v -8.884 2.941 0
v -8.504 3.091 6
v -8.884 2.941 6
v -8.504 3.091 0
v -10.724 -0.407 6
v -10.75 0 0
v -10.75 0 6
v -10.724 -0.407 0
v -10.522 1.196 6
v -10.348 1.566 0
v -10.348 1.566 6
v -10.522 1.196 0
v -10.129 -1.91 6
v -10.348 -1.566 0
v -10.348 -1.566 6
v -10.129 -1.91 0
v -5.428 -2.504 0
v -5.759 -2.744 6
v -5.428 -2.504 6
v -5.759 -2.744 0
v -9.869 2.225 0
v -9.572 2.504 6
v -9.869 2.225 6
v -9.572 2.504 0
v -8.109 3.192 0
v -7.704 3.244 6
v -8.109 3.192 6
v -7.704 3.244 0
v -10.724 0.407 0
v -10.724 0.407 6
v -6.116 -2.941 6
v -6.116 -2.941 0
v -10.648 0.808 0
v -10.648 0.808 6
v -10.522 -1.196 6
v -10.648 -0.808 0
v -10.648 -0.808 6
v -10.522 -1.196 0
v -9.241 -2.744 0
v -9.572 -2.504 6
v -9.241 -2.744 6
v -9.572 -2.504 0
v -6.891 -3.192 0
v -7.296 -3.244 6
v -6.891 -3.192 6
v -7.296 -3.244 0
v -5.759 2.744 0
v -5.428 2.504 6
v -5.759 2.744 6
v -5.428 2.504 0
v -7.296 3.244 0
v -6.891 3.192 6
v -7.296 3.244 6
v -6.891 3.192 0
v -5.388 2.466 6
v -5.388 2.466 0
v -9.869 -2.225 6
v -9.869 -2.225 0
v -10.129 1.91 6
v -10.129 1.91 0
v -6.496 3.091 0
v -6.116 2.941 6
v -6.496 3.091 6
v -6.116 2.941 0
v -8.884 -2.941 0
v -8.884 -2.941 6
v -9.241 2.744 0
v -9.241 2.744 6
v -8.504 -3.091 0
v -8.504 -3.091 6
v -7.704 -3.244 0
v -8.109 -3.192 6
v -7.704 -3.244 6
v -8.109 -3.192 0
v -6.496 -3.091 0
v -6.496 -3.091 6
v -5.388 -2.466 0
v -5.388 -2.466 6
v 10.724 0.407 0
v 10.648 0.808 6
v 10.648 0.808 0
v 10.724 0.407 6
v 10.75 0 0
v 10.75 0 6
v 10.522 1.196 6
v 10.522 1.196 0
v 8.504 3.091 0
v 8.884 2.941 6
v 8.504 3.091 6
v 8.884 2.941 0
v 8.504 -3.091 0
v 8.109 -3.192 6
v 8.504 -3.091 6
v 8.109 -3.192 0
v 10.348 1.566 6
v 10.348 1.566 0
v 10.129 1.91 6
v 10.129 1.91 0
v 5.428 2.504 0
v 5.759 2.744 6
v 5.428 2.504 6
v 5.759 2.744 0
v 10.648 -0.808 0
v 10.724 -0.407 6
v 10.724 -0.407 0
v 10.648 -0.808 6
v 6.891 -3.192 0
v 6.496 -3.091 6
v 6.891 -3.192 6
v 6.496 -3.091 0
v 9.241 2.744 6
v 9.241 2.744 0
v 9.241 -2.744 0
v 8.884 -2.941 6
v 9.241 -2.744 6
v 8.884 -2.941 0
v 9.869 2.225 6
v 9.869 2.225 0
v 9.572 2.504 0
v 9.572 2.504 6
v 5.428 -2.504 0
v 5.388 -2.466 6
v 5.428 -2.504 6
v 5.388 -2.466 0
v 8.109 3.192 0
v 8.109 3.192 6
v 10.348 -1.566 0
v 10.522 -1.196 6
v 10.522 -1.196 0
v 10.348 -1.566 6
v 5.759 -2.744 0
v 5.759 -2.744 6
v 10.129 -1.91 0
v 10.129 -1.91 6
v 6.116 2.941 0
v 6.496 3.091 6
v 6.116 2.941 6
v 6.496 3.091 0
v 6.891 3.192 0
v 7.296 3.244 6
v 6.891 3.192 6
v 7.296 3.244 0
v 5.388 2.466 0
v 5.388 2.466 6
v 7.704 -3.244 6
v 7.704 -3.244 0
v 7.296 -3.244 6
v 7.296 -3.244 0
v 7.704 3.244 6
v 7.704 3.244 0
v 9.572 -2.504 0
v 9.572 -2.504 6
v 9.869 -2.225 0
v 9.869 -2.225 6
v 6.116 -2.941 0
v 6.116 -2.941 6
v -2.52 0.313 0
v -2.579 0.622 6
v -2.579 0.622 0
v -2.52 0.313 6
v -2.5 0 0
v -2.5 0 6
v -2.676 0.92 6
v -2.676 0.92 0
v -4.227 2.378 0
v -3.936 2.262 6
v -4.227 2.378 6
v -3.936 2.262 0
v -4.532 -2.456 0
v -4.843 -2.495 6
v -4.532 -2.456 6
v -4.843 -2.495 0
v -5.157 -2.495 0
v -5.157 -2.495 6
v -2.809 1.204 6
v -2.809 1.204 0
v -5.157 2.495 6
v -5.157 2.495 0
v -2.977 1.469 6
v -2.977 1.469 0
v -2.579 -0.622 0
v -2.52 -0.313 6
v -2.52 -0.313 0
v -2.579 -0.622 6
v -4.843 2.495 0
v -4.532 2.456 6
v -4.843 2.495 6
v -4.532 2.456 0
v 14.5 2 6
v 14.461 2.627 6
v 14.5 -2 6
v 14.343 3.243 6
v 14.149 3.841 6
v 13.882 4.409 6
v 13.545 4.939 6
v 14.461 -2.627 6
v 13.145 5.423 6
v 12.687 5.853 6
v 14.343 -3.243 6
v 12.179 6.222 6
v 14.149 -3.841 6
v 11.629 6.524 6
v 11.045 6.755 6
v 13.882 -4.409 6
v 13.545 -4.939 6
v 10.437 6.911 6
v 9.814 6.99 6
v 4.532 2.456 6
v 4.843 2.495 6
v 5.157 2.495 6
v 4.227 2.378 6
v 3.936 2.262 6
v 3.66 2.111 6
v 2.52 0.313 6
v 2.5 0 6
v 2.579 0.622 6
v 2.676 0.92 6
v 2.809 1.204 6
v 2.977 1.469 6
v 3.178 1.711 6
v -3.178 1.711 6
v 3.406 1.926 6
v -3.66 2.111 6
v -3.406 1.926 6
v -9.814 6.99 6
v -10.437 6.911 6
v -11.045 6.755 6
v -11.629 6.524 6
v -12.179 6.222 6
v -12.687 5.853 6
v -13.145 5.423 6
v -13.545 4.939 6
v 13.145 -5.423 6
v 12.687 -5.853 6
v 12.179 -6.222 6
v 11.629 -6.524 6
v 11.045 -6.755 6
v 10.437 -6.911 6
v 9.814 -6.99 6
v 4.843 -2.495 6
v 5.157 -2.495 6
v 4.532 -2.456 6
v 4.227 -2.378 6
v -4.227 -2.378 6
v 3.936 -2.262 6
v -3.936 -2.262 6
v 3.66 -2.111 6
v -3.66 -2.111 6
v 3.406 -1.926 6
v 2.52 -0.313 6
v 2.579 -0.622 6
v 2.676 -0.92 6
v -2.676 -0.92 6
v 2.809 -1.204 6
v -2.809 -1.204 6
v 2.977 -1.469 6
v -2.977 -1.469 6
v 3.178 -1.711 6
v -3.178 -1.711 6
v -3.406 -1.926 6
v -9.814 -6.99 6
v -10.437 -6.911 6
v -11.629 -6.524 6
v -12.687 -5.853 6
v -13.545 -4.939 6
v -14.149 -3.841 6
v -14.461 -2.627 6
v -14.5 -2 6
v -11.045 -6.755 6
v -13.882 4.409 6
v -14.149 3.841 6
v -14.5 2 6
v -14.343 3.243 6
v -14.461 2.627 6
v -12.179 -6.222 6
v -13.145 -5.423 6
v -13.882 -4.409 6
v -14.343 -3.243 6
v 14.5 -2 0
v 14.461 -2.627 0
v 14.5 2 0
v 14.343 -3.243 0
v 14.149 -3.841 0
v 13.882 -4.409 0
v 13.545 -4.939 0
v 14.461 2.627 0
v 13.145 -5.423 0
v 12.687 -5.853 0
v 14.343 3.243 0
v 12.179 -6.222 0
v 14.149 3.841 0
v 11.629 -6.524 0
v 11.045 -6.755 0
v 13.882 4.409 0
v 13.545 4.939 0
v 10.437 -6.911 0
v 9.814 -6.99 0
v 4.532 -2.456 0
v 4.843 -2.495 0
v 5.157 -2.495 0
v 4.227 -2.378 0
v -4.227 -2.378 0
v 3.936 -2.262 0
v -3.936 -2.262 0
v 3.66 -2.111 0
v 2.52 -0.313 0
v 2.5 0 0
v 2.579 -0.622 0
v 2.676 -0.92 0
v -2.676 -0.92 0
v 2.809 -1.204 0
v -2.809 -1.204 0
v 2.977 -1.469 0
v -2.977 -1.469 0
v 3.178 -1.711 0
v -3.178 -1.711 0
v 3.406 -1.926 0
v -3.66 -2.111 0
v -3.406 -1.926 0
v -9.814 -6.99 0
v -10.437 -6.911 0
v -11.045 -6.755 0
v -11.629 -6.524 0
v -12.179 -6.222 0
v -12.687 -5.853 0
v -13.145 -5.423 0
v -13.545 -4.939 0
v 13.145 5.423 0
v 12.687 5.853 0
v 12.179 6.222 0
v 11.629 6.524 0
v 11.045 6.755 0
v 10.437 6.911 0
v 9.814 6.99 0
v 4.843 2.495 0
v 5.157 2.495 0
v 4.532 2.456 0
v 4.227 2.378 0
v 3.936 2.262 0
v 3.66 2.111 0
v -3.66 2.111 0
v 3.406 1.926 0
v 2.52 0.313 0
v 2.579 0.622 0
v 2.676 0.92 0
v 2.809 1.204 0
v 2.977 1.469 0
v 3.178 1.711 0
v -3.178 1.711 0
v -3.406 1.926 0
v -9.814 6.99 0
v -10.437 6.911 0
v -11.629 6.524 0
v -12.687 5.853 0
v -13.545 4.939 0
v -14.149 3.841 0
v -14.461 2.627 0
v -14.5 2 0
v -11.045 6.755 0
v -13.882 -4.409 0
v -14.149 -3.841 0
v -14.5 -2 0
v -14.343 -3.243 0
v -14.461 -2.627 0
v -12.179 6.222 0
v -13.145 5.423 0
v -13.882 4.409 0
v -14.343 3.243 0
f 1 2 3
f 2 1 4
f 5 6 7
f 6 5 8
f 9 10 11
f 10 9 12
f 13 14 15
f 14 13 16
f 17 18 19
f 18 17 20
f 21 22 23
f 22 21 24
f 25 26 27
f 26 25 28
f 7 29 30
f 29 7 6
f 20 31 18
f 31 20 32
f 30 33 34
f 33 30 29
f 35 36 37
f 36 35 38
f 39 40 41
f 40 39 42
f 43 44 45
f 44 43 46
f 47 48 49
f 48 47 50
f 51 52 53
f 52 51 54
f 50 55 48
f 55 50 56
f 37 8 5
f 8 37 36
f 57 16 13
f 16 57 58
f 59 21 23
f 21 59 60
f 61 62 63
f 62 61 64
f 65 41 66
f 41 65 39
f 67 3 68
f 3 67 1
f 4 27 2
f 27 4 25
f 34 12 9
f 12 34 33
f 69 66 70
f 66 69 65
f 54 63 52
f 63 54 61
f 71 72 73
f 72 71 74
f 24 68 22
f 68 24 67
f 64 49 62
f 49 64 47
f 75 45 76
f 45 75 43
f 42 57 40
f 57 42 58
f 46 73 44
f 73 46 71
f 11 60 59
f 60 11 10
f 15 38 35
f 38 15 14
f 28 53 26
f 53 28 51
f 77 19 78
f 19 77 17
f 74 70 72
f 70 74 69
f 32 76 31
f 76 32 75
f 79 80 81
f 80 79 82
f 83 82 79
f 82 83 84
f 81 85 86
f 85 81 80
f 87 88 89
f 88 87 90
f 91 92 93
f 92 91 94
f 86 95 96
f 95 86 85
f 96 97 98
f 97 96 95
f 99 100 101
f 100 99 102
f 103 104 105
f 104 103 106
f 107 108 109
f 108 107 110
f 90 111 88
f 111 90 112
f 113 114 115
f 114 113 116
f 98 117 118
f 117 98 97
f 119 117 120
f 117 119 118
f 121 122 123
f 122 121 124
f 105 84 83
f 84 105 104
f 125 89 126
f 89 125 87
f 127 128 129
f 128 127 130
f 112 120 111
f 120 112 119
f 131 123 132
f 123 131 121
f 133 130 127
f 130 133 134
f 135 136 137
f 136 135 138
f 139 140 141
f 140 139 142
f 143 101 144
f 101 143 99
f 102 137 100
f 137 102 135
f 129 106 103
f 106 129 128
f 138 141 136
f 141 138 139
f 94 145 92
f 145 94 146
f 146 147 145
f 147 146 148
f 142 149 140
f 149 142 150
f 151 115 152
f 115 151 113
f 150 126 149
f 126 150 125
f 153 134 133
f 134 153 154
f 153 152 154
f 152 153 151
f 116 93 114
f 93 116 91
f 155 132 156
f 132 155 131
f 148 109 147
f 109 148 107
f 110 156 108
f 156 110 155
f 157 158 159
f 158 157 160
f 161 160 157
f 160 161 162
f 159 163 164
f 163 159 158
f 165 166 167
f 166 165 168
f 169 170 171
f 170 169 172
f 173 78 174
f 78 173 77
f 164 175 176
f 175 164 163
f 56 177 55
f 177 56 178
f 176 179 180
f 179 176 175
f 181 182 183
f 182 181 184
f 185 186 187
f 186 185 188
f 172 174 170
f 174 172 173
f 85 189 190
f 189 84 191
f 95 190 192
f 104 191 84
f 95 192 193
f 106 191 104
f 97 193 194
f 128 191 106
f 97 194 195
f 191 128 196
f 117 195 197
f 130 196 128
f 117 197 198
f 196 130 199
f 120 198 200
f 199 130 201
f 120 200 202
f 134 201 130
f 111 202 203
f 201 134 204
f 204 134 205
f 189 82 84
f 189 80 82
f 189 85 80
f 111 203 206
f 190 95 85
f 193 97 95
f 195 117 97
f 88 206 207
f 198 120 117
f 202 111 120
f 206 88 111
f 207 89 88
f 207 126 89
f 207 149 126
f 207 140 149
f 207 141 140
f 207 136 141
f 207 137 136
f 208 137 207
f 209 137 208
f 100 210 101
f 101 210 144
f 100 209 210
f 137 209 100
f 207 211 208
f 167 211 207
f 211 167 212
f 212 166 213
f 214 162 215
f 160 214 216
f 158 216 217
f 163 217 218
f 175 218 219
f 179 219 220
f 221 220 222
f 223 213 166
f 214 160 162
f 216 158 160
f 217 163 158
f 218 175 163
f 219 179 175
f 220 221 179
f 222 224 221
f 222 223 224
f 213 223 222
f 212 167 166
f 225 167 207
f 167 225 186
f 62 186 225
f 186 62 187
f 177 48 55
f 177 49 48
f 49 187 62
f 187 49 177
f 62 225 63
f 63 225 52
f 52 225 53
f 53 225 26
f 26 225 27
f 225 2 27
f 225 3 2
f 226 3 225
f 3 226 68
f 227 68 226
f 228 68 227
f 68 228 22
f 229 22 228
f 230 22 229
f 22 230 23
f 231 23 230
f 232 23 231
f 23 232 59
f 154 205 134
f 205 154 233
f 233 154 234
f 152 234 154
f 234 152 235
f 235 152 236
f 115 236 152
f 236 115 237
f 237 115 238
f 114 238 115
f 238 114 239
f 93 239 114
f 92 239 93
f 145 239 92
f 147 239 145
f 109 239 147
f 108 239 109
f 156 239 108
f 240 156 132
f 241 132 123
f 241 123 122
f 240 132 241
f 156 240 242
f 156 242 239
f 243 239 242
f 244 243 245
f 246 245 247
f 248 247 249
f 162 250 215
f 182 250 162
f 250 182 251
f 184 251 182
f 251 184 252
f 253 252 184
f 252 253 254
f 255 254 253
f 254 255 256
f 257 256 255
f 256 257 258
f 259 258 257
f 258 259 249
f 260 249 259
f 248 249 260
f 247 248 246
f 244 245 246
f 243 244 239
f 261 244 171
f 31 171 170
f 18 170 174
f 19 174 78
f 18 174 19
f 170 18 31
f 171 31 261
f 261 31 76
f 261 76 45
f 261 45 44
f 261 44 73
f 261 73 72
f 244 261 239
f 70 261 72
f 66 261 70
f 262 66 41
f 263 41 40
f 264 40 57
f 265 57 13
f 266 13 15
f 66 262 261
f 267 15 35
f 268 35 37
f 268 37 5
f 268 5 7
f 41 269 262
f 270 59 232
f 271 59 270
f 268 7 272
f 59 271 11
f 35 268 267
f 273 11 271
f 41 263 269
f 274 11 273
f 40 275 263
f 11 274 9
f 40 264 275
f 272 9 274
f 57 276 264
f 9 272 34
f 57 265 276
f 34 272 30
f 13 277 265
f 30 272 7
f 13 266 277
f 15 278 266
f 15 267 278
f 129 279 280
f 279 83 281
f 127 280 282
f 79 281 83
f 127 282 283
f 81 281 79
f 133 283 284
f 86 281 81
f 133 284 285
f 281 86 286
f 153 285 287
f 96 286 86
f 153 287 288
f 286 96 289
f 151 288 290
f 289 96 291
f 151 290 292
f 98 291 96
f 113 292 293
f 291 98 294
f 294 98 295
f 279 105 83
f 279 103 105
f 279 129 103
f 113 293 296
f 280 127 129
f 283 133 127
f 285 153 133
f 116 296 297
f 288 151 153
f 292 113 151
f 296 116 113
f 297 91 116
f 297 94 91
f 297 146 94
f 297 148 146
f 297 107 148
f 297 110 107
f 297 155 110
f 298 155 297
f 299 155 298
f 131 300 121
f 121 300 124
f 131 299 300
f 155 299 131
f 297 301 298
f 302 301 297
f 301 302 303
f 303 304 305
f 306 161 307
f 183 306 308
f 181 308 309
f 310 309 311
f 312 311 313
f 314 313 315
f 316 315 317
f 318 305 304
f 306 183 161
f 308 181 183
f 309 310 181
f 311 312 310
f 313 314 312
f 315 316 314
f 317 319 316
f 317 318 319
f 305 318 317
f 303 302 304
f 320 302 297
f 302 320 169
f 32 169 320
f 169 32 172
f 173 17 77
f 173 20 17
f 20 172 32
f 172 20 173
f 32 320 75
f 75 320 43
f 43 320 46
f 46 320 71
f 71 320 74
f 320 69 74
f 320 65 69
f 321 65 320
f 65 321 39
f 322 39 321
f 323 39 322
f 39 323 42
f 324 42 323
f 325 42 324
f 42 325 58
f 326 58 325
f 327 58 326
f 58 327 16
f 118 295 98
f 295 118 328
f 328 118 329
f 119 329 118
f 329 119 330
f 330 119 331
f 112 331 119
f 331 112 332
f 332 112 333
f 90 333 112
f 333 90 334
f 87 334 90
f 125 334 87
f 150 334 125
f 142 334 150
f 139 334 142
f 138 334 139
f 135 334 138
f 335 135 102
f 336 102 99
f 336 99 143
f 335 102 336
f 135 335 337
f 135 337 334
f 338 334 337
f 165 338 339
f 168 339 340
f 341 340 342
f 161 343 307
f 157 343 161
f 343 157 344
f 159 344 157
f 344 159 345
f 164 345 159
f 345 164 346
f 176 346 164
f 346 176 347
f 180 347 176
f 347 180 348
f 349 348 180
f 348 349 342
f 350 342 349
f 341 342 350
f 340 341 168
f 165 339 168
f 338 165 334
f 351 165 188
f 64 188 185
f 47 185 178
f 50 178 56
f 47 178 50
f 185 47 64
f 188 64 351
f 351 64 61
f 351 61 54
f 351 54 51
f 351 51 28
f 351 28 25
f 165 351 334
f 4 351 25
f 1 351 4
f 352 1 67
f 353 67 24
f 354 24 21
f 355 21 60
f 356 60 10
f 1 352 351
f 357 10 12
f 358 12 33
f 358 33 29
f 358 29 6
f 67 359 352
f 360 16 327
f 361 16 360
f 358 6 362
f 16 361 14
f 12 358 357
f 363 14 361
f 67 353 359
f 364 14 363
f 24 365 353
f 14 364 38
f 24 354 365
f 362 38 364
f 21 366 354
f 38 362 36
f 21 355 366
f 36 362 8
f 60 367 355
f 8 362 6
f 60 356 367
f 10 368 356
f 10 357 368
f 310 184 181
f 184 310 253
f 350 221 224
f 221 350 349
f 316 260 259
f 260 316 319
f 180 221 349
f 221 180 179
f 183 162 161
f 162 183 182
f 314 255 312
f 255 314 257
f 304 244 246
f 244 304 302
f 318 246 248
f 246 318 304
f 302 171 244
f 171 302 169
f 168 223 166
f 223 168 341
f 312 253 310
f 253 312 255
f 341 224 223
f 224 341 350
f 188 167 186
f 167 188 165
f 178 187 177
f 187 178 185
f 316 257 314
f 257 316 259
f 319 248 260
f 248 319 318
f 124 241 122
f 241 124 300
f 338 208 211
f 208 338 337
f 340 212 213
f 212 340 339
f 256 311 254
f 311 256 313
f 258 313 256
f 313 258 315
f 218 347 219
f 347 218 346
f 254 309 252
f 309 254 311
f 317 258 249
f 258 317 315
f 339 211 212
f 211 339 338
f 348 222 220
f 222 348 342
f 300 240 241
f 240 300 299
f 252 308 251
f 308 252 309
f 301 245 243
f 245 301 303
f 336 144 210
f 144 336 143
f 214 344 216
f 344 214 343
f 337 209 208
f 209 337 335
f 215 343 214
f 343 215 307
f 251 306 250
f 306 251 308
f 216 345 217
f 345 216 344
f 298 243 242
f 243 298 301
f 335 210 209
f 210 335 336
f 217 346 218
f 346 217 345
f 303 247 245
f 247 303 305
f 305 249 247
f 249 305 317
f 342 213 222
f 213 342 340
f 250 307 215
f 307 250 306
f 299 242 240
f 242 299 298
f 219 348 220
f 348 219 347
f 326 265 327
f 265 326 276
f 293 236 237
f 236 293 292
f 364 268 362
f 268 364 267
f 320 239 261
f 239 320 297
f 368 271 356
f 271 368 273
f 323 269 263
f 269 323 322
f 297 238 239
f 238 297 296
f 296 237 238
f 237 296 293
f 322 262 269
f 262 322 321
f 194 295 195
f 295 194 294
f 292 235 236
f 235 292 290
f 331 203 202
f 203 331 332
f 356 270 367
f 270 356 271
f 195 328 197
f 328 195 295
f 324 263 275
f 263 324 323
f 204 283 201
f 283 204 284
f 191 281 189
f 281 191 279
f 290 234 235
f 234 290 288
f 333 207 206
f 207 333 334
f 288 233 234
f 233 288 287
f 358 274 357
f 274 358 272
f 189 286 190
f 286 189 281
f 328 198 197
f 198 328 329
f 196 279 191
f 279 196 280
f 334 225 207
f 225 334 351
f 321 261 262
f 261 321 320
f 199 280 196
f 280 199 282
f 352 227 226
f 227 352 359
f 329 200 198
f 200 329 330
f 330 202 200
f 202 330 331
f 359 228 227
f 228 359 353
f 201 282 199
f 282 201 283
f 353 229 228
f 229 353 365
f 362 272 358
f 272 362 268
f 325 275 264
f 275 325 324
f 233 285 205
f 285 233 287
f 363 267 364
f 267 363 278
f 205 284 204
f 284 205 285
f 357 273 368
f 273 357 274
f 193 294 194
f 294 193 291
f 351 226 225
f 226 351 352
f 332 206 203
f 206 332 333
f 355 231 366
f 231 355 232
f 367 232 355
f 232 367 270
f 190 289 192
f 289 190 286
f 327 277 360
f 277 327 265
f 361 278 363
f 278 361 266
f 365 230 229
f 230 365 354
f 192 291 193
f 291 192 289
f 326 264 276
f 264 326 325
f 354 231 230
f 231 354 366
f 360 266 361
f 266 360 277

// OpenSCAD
$fn = 50;


difference() {
	union() {
		hull() {
			translate(v = [-9.5000000000, 2.0000000000, 0]) {
				cylinder(h = 6, r = 5);
			}
			translate(v = [9.5000000000, 2.0000000000, 0]) {
				cylinder(h = 6, r = 5);
			}
			translate(v = [-9.5000000000, -2.0000000000, 0]) {
				cylinder(h = 6, r = 5);
			}
			translate(v = [9.5000000000, -2.0000000000, 0]) {
				cylinder(h = 6, r = 5);
			}
		}
	}
	union() {
		#translate(v = [-7.5000000000, 0.0000000000, -100.0000000000]) {
			cylinder(h = 200, r = 3.2500000000);
		}
		#translate(v = [-7.5000000000, 0.0000000000, -100.0000000000]) {
			cylinder(h = 200, r = 3.2500000000);
		}
		#translate(v = [7.5000000000, 0.0000000000, -100.0000000000]) {
			cylinder(h = 200, r = 3.2500000000);
		}
		#translate(v = [7.5000000000, 0.0000000000, -100.0000000000]) {
			cylinder(h = 200, r = 3.2500000000);
		}
		#translate(v = [-5.0000000000, 0, 0]) {
			cylinder(h = 6, r = 2.5000000000);
		}
		#translate(v = [5.0000000000, 0, 0]) {
			cylinder(h = 6, r = 2.5000000000);
		}
	}
}
